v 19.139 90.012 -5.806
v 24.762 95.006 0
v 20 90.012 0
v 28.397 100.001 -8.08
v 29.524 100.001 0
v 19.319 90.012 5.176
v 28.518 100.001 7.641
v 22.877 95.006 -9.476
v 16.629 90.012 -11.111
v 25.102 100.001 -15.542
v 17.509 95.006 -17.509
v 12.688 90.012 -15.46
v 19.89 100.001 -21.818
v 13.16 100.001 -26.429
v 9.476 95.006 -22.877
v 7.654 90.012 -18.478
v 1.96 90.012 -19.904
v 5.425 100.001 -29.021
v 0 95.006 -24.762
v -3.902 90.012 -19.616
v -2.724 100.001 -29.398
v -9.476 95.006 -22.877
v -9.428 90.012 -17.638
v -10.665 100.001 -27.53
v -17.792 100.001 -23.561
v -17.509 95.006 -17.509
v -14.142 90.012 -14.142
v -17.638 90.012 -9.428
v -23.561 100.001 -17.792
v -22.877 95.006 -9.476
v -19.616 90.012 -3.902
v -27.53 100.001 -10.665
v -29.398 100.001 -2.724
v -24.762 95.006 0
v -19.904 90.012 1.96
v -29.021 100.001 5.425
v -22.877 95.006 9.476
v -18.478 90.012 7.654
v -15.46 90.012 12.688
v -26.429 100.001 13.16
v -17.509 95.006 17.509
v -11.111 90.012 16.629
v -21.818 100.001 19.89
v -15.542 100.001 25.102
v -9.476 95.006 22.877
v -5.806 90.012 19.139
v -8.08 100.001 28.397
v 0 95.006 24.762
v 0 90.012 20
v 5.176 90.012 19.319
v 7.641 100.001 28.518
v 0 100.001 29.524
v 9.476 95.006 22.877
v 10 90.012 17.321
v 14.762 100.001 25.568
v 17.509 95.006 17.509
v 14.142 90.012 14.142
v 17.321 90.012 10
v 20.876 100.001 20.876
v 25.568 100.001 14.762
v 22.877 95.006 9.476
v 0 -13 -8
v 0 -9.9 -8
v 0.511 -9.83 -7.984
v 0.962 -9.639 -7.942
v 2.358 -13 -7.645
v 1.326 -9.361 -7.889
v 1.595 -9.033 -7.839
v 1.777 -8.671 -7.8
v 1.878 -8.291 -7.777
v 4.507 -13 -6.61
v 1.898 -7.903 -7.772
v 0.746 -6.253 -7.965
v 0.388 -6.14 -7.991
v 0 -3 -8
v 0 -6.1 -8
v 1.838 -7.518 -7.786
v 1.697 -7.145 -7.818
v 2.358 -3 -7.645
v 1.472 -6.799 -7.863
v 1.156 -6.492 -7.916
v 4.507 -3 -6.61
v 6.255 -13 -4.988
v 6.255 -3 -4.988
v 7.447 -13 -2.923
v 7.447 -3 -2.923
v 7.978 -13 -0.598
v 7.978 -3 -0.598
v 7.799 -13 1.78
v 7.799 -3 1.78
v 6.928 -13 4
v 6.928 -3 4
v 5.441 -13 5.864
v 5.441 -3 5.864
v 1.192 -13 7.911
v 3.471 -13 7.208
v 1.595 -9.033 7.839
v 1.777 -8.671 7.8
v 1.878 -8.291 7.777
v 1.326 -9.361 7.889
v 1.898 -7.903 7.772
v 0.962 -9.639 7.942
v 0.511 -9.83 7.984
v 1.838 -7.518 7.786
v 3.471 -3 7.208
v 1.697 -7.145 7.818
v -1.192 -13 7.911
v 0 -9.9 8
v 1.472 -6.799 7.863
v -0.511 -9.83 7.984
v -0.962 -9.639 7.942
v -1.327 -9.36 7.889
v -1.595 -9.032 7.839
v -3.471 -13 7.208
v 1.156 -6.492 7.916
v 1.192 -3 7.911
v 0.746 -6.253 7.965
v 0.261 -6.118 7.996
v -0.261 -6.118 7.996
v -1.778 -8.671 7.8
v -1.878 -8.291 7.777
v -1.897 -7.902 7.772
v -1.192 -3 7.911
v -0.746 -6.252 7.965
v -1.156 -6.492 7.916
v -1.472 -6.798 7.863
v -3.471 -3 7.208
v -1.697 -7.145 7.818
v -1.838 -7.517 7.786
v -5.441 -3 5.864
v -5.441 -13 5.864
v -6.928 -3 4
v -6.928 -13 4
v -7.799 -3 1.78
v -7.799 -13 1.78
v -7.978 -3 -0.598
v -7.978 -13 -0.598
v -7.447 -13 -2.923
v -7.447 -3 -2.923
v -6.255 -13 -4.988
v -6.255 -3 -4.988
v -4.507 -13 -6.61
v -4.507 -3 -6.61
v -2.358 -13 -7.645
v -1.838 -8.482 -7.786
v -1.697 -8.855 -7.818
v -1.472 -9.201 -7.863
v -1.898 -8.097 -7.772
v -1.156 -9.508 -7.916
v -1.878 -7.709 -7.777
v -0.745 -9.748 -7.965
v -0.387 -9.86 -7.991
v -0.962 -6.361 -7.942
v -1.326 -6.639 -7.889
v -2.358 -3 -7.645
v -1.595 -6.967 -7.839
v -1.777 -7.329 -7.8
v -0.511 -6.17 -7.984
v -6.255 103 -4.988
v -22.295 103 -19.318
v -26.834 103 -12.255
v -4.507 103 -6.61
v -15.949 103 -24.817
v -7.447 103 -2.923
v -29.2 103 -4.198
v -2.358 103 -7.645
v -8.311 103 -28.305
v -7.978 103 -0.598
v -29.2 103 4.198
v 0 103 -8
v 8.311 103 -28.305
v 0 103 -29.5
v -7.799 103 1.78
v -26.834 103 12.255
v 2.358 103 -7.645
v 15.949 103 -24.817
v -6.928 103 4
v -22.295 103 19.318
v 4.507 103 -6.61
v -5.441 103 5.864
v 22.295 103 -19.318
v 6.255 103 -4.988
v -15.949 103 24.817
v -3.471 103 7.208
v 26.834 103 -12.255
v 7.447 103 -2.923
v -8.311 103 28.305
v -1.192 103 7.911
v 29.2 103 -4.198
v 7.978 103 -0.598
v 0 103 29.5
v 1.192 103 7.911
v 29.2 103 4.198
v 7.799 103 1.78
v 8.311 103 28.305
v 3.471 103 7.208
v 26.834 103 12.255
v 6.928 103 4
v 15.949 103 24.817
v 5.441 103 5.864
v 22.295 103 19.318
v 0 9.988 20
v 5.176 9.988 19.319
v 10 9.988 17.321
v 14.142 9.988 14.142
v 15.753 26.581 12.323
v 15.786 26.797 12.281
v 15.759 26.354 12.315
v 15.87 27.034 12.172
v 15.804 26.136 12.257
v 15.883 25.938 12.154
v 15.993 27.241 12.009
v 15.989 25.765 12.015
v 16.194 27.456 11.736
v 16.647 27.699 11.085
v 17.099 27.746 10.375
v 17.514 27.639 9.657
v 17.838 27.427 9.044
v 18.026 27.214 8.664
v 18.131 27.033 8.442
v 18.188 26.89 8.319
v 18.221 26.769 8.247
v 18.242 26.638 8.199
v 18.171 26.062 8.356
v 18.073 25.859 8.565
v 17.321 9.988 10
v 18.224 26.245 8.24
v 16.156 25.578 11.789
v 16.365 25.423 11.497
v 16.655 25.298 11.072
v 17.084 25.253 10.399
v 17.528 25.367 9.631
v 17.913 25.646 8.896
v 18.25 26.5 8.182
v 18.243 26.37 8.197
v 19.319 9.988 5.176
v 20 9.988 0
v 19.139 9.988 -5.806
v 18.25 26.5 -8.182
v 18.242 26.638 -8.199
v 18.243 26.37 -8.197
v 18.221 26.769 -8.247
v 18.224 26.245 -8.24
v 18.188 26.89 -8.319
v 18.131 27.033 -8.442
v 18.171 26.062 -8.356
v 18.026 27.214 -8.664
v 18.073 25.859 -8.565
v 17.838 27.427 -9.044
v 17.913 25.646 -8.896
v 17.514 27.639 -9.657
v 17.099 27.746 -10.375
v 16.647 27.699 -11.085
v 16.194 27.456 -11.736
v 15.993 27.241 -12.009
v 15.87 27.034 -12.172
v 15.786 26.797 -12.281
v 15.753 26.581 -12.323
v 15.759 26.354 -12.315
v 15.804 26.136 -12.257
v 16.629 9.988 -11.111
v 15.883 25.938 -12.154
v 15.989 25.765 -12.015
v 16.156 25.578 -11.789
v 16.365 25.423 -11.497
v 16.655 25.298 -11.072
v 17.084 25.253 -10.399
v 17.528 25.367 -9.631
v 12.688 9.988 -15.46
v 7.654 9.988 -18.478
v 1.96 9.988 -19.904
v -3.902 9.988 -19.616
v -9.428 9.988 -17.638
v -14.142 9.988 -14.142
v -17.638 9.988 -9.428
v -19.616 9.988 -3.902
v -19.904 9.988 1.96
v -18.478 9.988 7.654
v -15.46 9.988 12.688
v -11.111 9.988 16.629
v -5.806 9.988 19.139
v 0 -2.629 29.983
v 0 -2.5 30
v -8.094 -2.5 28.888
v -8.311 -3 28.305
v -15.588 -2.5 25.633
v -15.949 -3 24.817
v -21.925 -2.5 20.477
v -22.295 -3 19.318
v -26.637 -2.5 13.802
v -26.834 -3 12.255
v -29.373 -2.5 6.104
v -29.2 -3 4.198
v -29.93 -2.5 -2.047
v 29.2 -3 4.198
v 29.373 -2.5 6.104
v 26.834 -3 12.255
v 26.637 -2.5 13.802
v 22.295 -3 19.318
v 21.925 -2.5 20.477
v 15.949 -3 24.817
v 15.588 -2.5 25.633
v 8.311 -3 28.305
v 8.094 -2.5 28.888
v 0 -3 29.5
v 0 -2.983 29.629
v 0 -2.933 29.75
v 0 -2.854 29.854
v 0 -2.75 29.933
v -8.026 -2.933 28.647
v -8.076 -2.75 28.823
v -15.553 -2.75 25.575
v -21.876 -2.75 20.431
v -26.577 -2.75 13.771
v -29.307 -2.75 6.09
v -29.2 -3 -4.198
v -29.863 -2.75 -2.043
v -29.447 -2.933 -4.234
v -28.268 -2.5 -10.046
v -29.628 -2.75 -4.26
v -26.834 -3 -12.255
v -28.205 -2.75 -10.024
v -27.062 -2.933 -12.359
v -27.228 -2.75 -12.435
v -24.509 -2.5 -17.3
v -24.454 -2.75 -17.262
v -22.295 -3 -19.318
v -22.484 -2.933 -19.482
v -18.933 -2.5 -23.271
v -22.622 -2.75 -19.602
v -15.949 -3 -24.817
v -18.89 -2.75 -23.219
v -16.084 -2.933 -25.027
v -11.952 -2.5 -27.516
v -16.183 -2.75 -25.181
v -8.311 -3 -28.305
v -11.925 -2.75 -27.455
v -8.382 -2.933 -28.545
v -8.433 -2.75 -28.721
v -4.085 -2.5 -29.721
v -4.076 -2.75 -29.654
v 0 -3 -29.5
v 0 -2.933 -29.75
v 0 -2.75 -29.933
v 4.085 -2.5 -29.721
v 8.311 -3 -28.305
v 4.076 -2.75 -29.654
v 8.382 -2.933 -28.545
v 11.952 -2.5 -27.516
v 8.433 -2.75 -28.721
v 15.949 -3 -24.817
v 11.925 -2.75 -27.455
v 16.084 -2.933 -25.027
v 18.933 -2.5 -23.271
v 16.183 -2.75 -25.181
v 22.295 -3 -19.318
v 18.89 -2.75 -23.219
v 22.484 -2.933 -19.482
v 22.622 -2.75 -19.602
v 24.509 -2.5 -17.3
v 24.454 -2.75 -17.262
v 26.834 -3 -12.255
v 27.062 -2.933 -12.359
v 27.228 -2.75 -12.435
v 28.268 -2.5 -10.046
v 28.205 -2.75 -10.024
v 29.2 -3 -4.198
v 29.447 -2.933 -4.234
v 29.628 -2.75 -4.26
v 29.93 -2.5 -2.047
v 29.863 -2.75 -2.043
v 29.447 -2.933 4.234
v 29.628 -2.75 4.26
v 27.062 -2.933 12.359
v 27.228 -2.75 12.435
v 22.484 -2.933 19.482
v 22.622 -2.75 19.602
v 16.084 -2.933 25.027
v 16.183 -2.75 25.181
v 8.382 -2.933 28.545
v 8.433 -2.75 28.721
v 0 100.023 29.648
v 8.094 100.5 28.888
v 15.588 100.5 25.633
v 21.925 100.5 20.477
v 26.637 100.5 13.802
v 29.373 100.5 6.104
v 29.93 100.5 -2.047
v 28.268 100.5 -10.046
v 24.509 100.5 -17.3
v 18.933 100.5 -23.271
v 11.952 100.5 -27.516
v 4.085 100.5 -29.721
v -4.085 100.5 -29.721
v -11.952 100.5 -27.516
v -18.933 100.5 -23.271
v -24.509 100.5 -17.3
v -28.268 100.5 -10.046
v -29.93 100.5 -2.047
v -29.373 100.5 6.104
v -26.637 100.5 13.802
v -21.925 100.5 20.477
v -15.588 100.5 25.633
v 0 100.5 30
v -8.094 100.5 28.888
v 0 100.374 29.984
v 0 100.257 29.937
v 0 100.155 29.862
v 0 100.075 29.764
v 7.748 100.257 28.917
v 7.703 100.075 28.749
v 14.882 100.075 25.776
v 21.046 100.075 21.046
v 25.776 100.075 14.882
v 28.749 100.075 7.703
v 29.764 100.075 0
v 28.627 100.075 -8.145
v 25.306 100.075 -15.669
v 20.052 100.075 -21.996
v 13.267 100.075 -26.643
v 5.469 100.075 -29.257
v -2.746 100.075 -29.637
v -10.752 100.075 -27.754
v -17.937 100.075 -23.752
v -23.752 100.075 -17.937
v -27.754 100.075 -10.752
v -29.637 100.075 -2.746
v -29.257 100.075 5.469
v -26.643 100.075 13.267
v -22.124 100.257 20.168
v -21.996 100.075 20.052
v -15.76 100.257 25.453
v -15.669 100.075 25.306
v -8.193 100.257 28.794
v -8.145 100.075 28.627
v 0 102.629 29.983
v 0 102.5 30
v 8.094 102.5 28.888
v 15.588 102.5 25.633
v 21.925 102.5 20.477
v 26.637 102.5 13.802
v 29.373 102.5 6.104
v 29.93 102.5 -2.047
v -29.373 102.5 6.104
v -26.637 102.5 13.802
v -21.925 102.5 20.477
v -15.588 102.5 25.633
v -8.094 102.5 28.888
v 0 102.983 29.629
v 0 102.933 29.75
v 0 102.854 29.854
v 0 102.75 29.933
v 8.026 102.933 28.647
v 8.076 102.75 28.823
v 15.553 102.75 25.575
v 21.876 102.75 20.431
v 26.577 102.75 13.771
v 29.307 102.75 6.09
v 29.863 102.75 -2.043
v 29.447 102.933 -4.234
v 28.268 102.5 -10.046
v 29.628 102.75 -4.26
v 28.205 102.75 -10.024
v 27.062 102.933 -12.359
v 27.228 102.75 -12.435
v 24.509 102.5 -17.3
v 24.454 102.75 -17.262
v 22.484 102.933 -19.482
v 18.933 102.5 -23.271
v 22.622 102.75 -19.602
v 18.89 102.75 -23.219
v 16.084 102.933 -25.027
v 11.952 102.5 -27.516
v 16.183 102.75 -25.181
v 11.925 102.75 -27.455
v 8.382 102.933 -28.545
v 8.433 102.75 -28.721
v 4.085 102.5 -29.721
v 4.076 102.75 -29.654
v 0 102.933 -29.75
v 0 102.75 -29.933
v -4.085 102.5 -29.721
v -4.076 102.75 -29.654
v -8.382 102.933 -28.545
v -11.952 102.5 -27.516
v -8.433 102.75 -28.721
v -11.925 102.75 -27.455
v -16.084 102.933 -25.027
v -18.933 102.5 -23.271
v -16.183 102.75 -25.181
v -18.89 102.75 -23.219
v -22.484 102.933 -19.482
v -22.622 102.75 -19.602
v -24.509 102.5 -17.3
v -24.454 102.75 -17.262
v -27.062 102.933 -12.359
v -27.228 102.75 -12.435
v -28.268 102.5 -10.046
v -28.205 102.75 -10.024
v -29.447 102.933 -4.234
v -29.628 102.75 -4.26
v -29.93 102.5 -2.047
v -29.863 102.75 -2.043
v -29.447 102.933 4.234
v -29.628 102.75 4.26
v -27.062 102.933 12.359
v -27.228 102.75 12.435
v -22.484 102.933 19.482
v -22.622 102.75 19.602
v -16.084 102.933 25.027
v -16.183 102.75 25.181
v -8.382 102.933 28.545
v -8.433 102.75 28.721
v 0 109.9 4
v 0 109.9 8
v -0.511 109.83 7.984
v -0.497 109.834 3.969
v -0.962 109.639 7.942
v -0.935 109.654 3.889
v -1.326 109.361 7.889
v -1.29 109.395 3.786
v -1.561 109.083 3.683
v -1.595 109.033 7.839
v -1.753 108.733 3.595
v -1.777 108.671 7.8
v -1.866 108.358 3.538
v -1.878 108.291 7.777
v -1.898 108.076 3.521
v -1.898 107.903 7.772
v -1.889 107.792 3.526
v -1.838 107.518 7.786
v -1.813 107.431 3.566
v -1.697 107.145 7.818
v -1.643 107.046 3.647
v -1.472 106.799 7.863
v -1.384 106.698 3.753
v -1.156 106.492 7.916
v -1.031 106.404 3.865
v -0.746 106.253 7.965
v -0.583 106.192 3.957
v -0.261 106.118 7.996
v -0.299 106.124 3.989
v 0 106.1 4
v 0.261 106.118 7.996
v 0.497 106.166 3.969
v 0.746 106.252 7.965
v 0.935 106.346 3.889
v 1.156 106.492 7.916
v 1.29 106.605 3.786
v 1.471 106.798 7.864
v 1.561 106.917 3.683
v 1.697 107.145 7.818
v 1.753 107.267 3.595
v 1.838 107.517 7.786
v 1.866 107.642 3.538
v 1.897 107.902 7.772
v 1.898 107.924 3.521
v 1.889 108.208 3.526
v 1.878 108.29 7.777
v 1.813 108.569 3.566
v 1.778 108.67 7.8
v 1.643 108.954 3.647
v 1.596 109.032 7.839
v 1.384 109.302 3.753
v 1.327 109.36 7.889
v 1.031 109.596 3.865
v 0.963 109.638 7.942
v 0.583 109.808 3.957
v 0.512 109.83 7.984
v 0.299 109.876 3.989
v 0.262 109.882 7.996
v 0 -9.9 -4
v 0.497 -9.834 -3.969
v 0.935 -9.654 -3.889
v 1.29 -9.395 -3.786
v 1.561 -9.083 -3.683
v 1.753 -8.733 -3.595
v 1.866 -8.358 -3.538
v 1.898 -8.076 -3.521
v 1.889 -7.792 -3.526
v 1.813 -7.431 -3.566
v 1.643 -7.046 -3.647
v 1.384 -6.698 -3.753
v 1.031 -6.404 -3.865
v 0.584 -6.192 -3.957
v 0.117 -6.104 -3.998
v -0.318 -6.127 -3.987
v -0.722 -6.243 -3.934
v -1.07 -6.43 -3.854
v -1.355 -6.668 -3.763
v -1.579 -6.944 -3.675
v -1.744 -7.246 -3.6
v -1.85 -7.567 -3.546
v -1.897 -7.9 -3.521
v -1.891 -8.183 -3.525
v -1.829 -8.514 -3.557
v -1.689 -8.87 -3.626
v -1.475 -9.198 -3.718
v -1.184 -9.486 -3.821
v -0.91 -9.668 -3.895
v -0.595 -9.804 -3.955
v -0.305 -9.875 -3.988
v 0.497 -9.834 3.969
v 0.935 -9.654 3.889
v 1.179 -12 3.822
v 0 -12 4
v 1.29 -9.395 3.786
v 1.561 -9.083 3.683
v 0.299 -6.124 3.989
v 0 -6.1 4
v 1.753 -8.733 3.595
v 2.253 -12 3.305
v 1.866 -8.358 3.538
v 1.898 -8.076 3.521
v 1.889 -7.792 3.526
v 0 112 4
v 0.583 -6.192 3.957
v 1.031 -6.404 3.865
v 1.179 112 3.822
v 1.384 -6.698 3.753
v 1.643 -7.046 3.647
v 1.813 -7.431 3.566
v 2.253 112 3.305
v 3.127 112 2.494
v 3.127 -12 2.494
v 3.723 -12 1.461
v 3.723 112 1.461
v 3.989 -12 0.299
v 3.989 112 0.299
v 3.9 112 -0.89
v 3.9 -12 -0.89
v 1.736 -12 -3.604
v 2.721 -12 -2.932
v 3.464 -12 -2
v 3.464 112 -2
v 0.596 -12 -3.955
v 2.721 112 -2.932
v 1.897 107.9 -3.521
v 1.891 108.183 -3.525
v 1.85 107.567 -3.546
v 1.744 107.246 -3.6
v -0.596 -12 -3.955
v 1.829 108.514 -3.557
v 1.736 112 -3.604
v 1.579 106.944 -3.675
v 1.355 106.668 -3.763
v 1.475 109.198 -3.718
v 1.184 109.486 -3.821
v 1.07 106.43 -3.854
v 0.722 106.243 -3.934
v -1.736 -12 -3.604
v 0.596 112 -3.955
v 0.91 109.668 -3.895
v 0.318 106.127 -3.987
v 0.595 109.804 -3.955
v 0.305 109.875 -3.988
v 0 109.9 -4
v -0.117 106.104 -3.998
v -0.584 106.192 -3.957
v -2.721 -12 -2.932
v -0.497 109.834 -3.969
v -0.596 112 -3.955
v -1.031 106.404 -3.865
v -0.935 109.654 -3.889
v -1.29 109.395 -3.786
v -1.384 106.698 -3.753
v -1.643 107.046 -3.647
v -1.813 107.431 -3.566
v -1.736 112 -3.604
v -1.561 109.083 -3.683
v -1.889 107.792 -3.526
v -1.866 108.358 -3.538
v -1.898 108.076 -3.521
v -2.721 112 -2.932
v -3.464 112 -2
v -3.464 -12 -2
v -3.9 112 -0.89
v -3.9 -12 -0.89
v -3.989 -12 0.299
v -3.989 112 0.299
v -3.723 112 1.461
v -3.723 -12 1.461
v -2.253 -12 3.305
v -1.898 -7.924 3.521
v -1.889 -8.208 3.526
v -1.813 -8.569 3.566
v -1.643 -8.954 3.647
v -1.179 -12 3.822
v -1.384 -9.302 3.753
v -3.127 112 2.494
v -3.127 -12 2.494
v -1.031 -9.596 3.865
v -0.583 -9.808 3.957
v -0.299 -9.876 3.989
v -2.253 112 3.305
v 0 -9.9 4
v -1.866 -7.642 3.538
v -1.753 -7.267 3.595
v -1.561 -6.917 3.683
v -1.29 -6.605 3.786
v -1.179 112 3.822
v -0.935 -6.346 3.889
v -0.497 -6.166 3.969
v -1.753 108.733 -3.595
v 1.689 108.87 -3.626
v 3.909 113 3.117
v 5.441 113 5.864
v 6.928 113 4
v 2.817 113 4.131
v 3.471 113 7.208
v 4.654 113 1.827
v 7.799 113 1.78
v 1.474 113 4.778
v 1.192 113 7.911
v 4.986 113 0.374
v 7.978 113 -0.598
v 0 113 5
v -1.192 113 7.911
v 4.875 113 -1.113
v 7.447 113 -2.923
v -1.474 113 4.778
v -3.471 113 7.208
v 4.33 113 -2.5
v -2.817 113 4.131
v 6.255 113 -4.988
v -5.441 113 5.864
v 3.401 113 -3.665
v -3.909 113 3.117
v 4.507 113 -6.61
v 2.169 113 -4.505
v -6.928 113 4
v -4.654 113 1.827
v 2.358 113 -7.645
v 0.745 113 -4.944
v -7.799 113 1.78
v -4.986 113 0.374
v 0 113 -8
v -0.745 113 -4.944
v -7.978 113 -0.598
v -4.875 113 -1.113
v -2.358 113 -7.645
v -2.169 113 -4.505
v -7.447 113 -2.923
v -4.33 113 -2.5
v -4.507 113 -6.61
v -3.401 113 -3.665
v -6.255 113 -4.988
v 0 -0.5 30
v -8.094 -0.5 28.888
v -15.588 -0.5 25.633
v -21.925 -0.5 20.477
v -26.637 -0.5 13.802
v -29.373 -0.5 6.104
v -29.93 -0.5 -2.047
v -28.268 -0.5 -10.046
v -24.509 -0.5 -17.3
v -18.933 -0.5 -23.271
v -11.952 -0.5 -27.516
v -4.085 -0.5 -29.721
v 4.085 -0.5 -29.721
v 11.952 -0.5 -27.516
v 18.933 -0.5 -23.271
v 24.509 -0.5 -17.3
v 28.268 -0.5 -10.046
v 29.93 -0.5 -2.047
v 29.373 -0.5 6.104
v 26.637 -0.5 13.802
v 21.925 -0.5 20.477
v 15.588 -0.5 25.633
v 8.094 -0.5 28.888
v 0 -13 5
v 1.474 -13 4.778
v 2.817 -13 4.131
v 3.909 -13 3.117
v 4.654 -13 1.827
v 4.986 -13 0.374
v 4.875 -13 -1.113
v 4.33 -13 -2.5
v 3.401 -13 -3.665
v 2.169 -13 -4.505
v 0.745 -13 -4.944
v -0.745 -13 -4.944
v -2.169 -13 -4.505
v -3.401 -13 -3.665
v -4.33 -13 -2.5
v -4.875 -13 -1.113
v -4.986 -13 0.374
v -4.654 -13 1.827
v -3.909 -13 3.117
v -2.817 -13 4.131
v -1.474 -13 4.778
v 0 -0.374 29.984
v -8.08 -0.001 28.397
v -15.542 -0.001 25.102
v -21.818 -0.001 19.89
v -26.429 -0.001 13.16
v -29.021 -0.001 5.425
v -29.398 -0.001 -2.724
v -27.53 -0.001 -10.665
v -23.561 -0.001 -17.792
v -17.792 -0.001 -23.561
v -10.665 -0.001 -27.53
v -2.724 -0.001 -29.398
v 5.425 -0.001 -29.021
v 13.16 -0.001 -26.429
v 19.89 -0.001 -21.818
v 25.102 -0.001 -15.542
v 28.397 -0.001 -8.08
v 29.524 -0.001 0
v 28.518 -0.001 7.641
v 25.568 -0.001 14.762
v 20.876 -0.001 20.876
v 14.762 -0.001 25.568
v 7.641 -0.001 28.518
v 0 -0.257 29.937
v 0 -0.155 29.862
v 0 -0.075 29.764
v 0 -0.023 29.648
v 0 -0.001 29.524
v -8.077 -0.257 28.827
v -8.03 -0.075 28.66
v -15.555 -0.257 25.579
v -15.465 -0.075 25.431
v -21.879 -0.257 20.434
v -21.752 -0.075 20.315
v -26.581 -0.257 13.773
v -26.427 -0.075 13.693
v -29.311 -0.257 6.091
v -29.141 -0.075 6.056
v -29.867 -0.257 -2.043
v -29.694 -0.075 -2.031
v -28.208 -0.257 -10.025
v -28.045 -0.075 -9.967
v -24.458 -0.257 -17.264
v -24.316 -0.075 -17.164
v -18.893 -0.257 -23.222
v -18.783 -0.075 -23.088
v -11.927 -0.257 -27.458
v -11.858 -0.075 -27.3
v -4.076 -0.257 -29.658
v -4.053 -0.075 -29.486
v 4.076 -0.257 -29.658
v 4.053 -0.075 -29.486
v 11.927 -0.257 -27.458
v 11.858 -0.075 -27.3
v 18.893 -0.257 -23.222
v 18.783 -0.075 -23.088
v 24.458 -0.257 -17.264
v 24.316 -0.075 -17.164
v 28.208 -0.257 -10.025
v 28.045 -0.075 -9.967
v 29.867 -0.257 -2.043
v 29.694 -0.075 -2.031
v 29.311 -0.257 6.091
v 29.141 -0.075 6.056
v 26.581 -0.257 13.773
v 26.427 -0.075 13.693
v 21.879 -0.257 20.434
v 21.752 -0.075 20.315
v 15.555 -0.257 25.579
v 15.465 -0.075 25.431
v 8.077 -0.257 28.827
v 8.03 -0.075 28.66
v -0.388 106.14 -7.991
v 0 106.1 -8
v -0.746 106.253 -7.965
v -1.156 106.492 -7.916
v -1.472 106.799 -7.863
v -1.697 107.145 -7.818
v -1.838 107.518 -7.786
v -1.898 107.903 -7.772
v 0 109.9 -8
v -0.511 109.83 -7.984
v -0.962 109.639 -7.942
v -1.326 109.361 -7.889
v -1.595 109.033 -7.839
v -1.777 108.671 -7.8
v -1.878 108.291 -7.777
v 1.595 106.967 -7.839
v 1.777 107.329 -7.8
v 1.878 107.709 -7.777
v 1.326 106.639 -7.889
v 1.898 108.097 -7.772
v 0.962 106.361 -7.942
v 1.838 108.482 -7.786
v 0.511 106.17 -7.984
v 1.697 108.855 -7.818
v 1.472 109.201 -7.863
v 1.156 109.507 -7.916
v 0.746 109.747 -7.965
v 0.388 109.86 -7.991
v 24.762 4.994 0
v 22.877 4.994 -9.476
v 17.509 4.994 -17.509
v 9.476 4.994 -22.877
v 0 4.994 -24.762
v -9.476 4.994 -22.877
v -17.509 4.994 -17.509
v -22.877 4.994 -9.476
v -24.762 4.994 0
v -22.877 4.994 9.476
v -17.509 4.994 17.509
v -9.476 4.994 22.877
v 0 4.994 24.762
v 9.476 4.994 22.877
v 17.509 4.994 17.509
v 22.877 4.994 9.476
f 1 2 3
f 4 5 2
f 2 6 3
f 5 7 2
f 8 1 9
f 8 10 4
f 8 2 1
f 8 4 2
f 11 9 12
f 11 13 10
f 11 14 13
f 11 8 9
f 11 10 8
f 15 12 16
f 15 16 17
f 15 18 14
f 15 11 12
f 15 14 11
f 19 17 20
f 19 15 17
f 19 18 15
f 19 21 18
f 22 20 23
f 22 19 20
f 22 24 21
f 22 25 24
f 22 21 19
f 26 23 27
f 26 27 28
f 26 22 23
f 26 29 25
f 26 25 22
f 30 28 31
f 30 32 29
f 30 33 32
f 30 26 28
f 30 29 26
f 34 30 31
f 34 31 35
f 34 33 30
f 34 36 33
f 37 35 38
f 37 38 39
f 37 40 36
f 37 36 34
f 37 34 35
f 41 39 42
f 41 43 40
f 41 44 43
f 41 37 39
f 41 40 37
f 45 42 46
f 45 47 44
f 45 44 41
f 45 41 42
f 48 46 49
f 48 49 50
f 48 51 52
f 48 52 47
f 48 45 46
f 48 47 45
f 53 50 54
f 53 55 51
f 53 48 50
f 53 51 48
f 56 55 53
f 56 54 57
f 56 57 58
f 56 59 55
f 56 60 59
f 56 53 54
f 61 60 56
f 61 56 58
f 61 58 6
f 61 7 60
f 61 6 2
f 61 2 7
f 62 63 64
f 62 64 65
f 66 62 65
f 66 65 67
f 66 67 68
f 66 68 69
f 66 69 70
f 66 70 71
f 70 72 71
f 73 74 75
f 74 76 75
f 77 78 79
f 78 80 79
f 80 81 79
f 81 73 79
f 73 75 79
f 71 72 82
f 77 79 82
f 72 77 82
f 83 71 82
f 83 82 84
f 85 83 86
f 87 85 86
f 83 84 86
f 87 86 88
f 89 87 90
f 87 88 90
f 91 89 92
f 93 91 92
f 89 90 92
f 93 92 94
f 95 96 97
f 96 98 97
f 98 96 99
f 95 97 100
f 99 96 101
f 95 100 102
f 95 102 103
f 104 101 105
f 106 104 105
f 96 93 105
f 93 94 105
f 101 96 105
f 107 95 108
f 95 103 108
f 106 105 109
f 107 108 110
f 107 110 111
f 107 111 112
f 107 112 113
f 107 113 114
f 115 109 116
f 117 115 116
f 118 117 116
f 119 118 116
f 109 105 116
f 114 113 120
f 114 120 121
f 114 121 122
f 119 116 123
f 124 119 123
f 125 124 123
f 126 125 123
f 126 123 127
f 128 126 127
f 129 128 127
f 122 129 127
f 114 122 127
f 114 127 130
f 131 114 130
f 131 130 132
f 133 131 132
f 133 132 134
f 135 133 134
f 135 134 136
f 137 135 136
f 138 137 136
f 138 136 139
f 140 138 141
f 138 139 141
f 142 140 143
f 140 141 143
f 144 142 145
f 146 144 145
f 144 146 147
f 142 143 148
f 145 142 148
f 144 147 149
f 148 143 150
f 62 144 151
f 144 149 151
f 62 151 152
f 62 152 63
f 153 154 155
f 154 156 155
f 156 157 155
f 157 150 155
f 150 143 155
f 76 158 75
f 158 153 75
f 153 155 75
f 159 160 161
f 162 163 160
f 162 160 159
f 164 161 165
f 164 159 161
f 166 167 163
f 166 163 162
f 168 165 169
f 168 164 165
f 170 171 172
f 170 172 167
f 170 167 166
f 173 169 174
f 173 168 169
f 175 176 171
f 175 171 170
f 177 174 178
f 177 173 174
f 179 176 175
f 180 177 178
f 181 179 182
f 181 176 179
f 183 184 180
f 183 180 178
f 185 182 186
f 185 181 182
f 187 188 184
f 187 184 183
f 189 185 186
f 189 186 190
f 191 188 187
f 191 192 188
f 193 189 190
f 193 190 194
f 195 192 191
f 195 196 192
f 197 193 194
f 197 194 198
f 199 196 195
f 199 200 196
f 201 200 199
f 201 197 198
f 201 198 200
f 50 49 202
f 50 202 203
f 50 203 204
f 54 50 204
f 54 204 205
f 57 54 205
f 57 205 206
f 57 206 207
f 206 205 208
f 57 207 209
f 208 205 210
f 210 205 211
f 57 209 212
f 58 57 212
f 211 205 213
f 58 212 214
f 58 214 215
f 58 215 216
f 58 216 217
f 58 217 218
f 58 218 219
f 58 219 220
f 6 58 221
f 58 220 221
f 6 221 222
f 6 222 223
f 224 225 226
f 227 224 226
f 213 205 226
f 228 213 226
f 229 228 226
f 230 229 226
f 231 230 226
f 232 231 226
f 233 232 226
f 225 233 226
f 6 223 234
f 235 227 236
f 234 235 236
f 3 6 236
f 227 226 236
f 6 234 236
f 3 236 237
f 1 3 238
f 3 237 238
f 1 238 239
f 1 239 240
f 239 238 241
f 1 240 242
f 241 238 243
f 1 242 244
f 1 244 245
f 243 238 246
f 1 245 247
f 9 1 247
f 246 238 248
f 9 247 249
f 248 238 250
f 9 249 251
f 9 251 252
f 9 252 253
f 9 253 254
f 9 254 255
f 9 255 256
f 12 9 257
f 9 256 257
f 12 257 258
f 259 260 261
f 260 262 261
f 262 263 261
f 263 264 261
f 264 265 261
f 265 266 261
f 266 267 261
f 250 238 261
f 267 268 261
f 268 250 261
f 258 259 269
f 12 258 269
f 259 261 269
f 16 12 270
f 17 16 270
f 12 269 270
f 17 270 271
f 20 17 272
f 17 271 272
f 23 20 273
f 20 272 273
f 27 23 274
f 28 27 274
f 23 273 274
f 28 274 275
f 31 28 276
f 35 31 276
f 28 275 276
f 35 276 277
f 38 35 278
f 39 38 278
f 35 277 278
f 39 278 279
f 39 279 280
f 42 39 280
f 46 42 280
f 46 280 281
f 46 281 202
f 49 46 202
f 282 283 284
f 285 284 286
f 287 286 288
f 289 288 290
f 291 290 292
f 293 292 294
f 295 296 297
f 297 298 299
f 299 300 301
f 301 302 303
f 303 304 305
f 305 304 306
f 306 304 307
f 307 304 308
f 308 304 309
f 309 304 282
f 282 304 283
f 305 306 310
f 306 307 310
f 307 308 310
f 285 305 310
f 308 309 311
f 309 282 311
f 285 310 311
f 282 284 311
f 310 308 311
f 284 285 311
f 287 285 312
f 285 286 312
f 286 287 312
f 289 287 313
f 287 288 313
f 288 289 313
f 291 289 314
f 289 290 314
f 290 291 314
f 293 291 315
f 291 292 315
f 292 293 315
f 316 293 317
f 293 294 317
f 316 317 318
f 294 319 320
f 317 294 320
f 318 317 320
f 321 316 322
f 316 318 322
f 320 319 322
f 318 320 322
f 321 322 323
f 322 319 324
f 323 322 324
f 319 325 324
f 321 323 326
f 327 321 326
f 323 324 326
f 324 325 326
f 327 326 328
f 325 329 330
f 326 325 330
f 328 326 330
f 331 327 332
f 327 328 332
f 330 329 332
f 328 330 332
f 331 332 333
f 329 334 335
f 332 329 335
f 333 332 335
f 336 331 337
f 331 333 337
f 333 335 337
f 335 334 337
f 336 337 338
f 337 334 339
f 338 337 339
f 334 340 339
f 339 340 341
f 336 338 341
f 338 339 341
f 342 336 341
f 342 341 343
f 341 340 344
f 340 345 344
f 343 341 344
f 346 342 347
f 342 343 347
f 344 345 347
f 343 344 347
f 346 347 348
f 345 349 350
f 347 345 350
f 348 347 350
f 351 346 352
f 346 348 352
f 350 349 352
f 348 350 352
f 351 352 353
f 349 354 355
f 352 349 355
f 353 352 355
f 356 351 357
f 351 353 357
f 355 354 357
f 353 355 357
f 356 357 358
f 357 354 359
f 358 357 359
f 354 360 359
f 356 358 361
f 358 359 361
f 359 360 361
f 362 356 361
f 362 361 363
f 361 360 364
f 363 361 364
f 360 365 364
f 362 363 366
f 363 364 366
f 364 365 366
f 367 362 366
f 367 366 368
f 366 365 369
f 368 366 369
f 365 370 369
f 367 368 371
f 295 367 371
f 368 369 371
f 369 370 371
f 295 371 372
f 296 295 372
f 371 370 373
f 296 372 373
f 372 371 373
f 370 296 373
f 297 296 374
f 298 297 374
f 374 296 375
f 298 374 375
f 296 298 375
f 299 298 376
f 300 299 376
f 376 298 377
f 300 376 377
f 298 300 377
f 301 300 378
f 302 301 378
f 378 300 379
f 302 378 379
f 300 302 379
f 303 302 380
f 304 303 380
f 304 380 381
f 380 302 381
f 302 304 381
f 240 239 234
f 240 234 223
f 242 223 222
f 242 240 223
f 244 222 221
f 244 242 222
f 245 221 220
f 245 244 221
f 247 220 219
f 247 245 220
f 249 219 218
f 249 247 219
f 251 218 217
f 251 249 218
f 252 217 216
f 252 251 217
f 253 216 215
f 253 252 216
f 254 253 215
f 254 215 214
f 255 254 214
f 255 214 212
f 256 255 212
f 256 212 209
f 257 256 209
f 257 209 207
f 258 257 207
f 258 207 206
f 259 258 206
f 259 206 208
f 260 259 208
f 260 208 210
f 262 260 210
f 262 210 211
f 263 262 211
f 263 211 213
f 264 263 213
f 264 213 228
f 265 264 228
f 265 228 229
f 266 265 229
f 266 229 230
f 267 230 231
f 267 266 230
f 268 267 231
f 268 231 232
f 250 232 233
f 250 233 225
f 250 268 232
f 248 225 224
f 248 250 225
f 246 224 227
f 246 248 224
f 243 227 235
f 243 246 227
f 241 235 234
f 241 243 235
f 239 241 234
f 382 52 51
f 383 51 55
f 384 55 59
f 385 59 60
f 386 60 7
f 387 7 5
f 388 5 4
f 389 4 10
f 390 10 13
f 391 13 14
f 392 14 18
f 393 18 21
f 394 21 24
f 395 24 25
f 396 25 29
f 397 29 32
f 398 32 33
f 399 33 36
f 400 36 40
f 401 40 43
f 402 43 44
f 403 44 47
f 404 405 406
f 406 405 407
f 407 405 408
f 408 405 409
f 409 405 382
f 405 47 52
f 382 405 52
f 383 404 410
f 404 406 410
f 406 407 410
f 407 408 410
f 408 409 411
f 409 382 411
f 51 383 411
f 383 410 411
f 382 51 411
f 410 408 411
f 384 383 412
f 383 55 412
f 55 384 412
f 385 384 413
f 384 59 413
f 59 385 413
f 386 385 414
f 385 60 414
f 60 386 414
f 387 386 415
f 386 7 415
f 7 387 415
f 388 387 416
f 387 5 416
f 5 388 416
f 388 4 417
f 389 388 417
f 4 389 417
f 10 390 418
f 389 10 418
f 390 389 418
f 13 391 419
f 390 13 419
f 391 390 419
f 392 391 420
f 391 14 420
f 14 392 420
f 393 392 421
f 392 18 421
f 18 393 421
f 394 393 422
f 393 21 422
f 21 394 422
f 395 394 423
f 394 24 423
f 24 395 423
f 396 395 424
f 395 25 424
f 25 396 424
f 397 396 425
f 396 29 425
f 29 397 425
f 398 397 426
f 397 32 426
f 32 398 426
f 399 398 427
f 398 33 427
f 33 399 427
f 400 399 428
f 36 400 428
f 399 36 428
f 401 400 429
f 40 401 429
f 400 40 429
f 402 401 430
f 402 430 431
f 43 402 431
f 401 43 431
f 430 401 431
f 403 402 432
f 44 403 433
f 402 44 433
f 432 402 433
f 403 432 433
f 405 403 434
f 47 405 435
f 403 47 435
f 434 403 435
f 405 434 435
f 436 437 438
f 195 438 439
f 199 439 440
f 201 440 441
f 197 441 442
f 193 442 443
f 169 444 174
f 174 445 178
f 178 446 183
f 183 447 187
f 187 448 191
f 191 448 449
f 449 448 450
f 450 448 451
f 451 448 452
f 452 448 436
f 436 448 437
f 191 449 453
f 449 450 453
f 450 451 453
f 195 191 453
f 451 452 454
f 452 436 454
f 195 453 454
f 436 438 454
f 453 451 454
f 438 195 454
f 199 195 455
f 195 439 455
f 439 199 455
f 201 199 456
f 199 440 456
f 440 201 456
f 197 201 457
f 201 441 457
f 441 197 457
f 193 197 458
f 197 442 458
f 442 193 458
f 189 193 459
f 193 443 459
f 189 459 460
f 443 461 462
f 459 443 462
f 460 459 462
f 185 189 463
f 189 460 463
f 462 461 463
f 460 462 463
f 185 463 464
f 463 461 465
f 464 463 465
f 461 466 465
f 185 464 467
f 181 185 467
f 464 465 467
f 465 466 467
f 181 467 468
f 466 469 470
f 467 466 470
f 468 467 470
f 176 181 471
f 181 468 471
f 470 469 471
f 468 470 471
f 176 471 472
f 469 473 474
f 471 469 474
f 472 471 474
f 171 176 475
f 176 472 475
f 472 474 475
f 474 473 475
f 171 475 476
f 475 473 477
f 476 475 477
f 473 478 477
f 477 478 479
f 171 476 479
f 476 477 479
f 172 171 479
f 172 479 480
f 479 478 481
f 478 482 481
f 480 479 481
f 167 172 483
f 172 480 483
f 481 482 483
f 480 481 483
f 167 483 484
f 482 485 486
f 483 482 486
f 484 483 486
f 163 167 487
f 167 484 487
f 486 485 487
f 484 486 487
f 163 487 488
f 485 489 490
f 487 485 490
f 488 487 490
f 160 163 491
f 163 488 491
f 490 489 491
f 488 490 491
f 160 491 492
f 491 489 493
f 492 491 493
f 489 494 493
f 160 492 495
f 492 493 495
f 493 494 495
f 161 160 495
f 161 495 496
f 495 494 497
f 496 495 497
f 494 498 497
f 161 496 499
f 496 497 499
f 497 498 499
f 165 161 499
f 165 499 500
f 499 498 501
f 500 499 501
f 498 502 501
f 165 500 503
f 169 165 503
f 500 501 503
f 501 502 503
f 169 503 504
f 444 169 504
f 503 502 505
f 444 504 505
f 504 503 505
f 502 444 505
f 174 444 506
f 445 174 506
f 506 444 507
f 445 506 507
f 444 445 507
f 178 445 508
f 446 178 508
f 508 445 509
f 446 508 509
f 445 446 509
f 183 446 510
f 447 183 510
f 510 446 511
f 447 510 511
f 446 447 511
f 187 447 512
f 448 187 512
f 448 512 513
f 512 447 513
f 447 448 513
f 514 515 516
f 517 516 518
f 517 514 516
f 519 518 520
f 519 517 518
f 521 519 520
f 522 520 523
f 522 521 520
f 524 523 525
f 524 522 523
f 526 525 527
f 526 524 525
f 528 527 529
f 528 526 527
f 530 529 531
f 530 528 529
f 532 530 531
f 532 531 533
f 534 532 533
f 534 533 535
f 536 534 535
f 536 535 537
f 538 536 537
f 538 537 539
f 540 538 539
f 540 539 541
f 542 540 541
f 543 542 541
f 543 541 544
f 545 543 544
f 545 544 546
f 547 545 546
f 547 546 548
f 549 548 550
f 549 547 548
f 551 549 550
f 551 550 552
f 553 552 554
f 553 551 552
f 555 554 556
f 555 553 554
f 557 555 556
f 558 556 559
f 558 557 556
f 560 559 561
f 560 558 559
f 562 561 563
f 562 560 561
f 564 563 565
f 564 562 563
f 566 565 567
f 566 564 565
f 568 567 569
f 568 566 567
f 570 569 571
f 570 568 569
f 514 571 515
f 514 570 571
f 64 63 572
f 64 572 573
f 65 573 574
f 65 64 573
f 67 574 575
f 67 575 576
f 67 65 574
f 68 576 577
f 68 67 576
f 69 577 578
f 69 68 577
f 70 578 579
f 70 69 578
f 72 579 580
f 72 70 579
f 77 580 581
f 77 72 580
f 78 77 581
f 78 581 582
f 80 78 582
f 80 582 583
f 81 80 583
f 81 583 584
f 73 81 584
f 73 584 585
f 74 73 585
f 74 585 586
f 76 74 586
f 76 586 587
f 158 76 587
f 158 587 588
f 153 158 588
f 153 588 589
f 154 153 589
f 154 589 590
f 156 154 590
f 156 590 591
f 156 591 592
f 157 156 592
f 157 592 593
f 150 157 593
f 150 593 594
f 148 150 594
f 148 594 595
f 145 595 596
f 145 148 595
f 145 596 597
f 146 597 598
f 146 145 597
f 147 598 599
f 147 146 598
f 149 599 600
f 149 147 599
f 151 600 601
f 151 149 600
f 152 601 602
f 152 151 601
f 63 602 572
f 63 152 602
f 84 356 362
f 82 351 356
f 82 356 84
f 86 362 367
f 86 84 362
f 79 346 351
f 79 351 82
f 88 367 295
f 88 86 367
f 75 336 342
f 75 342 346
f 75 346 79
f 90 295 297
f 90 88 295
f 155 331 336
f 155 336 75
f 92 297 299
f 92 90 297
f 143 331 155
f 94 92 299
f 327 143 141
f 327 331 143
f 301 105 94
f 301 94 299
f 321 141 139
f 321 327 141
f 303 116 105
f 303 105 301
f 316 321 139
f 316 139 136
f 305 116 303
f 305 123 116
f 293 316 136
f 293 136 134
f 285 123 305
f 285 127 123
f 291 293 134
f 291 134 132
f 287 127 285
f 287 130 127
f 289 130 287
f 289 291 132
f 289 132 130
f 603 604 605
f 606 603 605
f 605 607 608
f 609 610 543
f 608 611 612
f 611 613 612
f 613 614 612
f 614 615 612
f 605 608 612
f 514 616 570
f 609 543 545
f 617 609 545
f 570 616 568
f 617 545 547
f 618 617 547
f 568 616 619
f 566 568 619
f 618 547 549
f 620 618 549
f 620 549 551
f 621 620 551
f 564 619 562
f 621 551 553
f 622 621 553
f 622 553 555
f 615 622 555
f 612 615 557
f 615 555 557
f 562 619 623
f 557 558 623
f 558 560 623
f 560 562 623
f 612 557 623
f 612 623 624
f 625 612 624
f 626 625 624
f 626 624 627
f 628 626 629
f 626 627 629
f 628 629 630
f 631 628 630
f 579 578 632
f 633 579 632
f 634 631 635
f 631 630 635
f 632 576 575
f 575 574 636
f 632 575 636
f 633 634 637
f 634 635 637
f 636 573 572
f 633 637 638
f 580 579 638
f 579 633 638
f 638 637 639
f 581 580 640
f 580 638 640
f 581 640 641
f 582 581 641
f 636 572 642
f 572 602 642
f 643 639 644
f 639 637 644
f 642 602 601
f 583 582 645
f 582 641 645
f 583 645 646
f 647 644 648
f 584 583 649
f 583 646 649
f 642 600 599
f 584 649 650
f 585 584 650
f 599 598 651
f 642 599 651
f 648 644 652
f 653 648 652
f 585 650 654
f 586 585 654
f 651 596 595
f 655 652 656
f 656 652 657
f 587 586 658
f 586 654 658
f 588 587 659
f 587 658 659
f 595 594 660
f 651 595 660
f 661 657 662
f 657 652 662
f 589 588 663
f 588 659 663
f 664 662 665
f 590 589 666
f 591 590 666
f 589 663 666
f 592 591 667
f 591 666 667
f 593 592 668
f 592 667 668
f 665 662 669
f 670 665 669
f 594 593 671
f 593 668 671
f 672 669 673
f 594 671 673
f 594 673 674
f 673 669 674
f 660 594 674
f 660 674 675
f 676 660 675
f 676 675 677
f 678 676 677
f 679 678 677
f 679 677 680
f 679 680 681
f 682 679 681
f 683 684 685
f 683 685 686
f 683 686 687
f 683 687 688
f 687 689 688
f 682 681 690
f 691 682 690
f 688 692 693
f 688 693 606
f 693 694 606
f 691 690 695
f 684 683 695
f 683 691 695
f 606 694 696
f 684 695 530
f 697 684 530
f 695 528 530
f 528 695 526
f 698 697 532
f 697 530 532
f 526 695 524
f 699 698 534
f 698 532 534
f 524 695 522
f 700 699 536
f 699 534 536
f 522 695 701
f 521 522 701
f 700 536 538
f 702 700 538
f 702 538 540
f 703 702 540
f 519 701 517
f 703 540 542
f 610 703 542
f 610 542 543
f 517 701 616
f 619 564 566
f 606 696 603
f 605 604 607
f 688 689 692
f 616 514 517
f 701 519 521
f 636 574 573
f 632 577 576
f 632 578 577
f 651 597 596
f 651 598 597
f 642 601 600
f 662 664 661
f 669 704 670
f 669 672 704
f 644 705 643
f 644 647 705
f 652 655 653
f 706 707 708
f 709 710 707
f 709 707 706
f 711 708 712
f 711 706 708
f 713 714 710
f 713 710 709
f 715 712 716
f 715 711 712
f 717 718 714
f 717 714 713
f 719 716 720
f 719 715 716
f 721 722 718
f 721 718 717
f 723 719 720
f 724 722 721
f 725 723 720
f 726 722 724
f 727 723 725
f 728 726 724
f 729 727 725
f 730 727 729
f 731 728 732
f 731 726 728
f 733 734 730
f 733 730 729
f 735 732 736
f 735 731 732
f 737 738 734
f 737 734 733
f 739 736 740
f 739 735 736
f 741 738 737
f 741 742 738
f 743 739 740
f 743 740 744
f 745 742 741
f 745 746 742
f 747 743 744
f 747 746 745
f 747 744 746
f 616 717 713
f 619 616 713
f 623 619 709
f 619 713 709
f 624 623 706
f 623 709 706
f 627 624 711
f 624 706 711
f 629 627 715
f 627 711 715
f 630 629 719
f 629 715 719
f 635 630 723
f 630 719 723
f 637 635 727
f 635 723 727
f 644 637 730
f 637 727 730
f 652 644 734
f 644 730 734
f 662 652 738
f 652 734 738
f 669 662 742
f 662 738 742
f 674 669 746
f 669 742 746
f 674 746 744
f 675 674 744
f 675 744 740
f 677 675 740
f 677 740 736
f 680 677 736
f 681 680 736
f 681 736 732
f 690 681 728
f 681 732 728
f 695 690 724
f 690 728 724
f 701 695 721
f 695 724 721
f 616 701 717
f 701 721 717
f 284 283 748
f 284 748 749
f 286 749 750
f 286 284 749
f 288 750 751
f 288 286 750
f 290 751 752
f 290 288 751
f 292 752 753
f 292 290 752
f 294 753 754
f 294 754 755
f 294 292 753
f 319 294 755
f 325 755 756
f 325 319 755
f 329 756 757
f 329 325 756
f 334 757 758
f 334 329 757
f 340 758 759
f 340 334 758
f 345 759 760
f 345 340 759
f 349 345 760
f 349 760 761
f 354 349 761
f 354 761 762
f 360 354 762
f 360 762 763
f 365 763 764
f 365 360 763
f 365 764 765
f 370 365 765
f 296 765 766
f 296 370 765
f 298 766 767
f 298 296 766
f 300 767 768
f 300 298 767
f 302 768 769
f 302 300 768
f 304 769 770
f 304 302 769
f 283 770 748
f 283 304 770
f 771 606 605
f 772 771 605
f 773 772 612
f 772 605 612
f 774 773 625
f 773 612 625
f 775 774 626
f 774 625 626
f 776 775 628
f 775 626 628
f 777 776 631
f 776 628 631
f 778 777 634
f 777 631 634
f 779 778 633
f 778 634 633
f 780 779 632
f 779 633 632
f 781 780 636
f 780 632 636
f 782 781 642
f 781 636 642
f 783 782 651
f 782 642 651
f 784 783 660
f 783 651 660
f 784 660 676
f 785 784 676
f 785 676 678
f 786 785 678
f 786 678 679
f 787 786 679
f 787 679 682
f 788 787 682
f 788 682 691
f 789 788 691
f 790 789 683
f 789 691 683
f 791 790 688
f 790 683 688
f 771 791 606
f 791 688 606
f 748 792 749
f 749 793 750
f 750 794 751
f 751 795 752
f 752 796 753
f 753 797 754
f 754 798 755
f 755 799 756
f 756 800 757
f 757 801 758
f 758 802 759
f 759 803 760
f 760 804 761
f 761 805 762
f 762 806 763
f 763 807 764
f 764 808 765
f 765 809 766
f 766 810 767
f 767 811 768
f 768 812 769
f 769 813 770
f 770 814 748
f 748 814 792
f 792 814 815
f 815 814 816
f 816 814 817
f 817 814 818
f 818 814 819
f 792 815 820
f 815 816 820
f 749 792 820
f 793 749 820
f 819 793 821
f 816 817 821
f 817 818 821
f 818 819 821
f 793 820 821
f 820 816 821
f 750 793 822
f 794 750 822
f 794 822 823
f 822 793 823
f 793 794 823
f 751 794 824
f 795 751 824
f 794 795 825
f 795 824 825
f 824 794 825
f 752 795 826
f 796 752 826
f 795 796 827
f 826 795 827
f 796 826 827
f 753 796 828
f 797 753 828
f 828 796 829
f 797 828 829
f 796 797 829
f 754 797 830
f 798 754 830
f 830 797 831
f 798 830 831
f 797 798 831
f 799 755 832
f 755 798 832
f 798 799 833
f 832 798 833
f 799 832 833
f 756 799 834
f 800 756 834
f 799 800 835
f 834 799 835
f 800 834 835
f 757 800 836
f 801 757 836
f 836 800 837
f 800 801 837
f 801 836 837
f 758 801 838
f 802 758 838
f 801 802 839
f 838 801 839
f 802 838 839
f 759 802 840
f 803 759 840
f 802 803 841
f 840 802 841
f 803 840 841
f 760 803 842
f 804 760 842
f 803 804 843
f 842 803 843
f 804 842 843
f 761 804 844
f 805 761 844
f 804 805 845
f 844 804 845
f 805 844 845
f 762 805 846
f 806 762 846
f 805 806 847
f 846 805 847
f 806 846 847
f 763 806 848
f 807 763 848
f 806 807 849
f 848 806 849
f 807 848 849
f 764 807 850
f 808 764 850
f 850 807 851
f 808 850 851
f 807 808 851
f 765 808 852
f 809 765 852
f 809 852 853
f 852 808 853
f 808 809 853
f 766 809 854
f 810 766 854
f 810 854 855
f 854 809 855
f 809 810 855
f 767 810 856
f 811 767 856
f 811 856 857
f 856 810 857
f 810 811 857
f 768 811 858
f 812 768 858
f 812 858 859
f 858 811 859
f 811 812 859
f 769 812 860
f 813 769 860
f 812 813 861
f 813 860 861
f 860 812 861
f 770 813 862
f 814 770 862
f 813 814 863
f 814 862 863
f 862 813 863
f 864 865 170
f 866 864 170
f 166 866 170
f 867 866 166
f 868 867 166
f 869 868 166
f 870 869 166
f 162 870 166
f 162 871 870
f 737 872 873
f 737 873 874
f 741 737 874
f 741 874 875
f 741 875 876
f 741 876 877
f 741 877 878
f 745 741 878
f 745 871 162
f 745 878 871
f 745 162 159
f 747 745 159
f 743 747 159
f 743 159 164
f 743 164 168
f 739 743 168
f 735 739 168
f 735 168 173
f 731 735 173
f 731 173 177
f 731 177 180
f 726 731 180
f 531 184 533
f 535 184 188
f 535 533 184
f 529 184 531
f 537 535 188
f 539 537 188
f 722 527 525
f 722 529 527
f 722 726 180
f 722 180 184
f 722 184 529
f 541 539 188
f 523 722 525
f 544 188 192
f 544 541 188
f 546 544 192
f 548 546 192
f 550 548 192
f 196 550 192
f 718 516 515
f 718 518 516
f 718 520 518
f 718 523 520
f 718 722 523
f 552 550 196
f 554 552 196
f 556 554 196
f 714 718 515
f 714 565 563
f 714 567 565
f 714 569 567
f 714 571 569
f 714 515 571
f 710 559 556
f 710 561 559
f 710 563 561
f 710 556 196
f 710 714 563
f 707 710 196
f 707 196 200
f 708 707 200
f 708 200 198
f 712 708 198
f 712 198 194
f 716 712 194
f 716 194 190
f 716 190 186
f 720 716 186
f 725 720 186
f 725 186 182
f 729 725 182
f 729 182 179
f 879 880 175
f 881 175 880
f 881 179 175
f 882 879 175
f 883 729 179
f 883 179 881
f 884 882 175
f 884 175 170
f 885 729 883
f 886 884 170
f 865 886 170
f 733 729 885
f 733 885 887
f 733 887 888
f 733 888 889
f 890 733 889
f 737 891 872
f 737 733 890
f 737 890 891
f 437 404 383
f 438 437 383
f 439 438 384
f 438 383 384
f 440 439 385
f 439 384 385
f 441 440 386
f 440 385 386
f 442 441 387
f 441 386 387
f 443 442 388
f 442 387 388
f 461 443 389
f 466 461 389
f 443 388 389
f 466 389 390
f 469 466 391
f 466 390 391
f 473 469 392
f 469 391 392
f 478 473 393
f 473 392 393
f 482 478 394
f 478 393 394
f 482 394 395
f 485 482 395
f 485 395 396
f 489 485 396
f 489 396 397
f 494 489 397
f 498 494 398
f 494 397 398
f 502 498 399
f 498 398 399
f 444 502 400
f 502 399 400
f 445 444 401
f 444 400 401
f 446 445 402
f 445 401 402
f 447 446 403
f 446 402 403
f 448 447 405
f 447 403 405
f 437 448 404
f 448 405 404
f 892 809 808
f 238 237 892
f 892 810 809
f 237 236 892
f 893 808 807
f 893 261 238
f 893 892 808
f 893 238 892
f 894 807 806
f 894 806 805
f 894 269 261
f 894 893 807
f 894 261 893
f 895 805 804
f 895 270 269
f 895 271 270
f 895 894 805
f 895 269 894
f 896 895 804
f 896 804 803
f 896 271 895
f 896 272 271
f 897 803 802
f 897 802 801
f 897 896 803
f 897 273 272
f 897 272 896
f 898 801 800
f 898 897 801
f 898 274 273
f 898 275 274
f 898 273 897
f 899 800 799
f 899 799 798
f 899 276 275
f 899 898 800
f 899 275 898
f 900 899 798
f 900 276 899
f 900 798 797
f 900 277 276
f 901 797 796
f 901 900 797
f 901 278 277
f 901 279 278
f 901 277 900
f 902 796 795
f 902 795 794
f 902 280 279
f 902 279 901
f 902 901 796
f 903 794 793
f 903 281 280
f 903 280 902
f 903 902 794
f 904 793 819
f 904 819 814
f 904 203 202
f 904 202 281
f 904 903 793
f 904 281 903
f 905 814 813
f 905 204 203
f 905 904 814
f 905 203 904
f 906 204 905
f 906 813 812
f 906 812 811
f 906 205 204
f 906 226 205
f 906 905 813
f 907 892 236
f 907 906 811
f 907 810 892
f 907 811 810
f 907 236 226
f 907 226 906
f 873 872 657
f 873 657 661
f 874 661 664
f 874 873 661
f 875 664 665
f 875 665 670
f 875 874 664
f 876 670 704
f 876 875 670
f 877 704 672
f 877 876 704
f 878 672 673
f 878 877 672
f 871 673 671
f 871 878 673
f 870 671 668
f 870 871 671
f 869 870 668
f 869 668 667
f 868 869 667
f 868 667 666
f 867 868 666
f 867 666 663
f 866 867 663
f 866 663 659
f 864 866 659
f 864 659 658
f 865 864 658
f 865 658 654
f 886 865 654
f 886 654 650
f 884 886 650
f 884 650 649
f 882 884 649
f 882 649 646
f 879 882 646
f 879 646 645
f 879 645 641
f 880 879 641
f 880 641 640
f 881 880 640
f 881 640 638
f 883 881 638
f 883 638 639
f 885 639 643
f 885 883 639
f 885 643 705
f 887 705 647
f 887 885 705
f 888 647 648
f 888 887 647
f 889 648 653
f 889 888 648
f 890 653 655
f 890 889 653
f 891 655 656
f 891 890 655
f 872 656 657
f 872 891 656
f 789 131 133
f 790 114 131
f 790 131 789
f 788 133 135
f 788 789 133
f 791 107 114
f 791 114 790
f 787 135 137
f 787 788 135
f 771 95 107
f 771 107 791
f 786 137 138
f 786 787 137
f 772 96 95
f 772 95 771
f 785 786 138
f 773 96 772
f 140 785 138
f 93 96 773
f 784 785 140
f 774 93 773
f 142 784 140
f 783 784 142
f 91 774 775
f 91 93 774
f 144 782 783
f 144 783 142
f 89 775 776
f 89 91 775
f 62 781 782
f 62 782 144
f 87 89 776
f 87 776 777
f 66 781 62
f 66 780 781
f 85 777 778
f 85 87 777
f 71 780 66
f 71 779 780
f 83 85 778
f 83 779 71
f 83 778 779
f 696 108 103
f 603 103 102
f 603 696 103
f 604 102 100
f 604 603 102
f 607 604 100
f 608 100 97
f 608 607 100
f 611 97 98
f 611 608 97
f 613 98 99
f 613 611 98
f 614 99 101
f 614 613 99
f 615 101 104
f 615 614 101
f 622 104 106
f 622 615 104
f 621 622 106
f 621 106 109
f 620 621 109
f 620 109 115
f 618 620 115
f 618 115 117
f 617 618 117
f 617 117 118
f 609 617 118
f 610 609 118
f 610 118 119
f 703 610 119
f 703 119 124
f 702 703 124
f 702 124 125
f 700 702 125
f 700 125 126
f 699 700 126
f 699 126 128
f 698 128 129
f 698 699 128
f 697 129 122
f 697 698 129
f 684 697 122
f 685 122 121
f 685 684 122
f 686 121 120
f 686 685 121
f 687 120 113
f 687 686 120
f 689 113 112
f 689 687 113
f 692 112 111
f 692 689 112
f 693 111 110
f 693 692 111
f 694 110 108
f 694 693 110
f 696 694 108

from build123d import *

# Parameters (mm, degrees)
SKETCH_1_R               = 20
EXTRUDE_1_DEPTH          = 100
SKETCH_2_R               = 30
EXTRUDE_2_DEPTH          = 3
EXTRUDE_START            = 3
SKETCH_3_R               = 30
EXTRUDE_3_DEPTH          = 3
CUT_EXTRUDE_1_DEPTH      = 112.39569112
CUT_EXTRUDE_1_DEPTH_BACK = 112.39569112
SKETCH_4_R               = 1.25
SKETCH_6_R               = 8
EXTRUDE_4_DEPTH          = 10
EXTRUDE_START_2          = 10
SKETCH_5_R               = 8
EXTRUDE_5_DEPTH          = 10
CUT_EXTRUDE_2_DEPTH      = 121.702112658
CUT_EXTRUDE_2_DEPTH_BACK = 121.702112658
SKETCH_7_R               = 1.9
SKETCH_8_R               = 4
CUT_EXTRUDE_3_DEPTH      = 133.951118932
CHAMFER_1_SIZE           = 1
FILLET_1_R               = 0.5


with BuildPart() as part:
    # 草图1 → 凸台-拉伸1 (new body)
    with BuildSketch(Plane(origin=(0, 0, 0), x_dir=(1, 0, 0), z_dir=(0, 1, 0))):
        with Locations(Location((0, 0, 0), (0, 0, 270))):
            Circle(SKETCH_1_R)
    extrude(amount=EXTRUDE_1_DEPTH)

    # 草图2 → 凸台-拉伸2 (add)
    with BuildSketch(Plane(origin=(0, 100, 0), x_dir=(1, 0, 0), z_dir=(0, 1, 0))):
        with Locations(Location((0, 0, 0), (0, 0, 270))):
            Circle(SKETCH_2_R)
    extrude(amount=EXTRUDE_2_DEPTH)

    # 草图3 → 凸台-拉伸3 (add)
    with BuildSketch(Plane.XZ.offset(EXTRUDE_START)):
        with Locations(Location((0, 0, 0), (0, 0, 90))):
            Circle(SKETCH_3_R)
    extrude(amount=-EXTRUDE_3_DEPTH)

    # 草图4 → 切除-拉伸1 (cut, two sides: drawn at the far end of the back side and taken through both)
    with BuildSketch(Plane.XY.offset(-CUT_EXTRUDE_1_DEPTH_BACK)):
        with Locations((17, 26.5)):
            Circle(SKETCH_4_R)
    extrude(amount=CUT_EXTRUDE_1_DEPTH + CUT_EXTRUDE_1_DEPTH_BACK, mode=Mode.SUBTRACT)

    # 草图6 → 凸台-拉伸4 (add)
    with BuildSketch(Plane.XZ.offset(3)):
        with Locations(Location((0, 0, 0), (0, 0, 270))):
            Circle(SKETCH_6_R)
    extrude(amount=EXTRUDE_4_DEPTH)

    # 草图5 → 凸台-拉伸5 (add)
    with BuildSketch(Plane(origin=(0, 103, 0), x_dir=(1, 0, 0), z_dir=(0, 1, 0)).offset(EXTRUDE_START_2)):
        with Locations(Location((0, 0, 0), (0, 0, 90))):
            Circle(SKETCH_5_R)
    extrude(amount=-EXTRUDE_5_DEPTH)

    # 草图7 → 切除-拉伸2 (cut, two sides: drawn at the far end of the back side and taken through both)
    with BuildSketch(Plane.XY.offset(-CUT_EXTRUDE_2_DEPTH_BACK)):
        with Locations(Location((0, 108, 0), (0, 0, 90.000000026))):
            Circle(SKETCH_7_R)
        with Locations(Location((0, -8, 0), (0, 0, 269.999999974))):
            Circle(SKETCH_7_R)
    extrude(amount=CUT_EXTRUDE_2_DEPTH + CUT_EXTRUDE_2_DEPTH_BACK, mode=Mode.SUBTRACT)

    # 草图8 → 切除-拉伸3 (cut, through all)
    with BuildSketch(Plane(origin=(0, 113, 0), x_dir=(1, 0, 0), z_dir=(0, 1, 0))):
        with Locations(Location((0, 0, 0), (0, 0, 270))):
            Circle(SKETCH_8_R)
    extrude(amount=-CUT_EXTRUDE_3_DEPTH, mode=Mode.SUBTRACT)

    # 倒角1
    chamfer_1_edges = [part.edges().sort_by_distance(p)[0] for p in [
        (0, -13, -4),
        (0, 113, -4),
    ]]
    chamfer(chamfer_1_edges, length=CHAMFER_1_SIZE)

    # 圆角1
    fillet_1_edges = [part.edges().sort_by_distance(p)[0] for p in [
        (0, 0, -30),
        (0, -3, -30),
        (0, 100, -30),
        (0, 103, -30),
    ]]
    fillet(fillet_1_edges, radius=FILLET_1_R)

    # 倒角2: read off the stored shape, not the designer's step
    # 倒角2 outline → 倒角2 (revolve)
    with BuildSketch(Plane.XY):
        Polygon((20, 100), (20, 90.011911518), (29.523809524, 100.000567215), (29.5, 100.000567215), align=None)
    revolve(axis=Axis((0, 0, 0), (0, 1, 0)))

    # 倒角3: read off the stored shape, not the designer's step
    # 倒角3 outline → 倒角3 (revolve)
    with BuildSketch(Plane.XY):
        Polygon((20, 9.988088482), (20, 0), (29.5, 0), (29.523809524, -0.000567215), align=None)
    revolve(axis=Axis((0, 0, 0), (0, 1, 0)))


solid = part.part
